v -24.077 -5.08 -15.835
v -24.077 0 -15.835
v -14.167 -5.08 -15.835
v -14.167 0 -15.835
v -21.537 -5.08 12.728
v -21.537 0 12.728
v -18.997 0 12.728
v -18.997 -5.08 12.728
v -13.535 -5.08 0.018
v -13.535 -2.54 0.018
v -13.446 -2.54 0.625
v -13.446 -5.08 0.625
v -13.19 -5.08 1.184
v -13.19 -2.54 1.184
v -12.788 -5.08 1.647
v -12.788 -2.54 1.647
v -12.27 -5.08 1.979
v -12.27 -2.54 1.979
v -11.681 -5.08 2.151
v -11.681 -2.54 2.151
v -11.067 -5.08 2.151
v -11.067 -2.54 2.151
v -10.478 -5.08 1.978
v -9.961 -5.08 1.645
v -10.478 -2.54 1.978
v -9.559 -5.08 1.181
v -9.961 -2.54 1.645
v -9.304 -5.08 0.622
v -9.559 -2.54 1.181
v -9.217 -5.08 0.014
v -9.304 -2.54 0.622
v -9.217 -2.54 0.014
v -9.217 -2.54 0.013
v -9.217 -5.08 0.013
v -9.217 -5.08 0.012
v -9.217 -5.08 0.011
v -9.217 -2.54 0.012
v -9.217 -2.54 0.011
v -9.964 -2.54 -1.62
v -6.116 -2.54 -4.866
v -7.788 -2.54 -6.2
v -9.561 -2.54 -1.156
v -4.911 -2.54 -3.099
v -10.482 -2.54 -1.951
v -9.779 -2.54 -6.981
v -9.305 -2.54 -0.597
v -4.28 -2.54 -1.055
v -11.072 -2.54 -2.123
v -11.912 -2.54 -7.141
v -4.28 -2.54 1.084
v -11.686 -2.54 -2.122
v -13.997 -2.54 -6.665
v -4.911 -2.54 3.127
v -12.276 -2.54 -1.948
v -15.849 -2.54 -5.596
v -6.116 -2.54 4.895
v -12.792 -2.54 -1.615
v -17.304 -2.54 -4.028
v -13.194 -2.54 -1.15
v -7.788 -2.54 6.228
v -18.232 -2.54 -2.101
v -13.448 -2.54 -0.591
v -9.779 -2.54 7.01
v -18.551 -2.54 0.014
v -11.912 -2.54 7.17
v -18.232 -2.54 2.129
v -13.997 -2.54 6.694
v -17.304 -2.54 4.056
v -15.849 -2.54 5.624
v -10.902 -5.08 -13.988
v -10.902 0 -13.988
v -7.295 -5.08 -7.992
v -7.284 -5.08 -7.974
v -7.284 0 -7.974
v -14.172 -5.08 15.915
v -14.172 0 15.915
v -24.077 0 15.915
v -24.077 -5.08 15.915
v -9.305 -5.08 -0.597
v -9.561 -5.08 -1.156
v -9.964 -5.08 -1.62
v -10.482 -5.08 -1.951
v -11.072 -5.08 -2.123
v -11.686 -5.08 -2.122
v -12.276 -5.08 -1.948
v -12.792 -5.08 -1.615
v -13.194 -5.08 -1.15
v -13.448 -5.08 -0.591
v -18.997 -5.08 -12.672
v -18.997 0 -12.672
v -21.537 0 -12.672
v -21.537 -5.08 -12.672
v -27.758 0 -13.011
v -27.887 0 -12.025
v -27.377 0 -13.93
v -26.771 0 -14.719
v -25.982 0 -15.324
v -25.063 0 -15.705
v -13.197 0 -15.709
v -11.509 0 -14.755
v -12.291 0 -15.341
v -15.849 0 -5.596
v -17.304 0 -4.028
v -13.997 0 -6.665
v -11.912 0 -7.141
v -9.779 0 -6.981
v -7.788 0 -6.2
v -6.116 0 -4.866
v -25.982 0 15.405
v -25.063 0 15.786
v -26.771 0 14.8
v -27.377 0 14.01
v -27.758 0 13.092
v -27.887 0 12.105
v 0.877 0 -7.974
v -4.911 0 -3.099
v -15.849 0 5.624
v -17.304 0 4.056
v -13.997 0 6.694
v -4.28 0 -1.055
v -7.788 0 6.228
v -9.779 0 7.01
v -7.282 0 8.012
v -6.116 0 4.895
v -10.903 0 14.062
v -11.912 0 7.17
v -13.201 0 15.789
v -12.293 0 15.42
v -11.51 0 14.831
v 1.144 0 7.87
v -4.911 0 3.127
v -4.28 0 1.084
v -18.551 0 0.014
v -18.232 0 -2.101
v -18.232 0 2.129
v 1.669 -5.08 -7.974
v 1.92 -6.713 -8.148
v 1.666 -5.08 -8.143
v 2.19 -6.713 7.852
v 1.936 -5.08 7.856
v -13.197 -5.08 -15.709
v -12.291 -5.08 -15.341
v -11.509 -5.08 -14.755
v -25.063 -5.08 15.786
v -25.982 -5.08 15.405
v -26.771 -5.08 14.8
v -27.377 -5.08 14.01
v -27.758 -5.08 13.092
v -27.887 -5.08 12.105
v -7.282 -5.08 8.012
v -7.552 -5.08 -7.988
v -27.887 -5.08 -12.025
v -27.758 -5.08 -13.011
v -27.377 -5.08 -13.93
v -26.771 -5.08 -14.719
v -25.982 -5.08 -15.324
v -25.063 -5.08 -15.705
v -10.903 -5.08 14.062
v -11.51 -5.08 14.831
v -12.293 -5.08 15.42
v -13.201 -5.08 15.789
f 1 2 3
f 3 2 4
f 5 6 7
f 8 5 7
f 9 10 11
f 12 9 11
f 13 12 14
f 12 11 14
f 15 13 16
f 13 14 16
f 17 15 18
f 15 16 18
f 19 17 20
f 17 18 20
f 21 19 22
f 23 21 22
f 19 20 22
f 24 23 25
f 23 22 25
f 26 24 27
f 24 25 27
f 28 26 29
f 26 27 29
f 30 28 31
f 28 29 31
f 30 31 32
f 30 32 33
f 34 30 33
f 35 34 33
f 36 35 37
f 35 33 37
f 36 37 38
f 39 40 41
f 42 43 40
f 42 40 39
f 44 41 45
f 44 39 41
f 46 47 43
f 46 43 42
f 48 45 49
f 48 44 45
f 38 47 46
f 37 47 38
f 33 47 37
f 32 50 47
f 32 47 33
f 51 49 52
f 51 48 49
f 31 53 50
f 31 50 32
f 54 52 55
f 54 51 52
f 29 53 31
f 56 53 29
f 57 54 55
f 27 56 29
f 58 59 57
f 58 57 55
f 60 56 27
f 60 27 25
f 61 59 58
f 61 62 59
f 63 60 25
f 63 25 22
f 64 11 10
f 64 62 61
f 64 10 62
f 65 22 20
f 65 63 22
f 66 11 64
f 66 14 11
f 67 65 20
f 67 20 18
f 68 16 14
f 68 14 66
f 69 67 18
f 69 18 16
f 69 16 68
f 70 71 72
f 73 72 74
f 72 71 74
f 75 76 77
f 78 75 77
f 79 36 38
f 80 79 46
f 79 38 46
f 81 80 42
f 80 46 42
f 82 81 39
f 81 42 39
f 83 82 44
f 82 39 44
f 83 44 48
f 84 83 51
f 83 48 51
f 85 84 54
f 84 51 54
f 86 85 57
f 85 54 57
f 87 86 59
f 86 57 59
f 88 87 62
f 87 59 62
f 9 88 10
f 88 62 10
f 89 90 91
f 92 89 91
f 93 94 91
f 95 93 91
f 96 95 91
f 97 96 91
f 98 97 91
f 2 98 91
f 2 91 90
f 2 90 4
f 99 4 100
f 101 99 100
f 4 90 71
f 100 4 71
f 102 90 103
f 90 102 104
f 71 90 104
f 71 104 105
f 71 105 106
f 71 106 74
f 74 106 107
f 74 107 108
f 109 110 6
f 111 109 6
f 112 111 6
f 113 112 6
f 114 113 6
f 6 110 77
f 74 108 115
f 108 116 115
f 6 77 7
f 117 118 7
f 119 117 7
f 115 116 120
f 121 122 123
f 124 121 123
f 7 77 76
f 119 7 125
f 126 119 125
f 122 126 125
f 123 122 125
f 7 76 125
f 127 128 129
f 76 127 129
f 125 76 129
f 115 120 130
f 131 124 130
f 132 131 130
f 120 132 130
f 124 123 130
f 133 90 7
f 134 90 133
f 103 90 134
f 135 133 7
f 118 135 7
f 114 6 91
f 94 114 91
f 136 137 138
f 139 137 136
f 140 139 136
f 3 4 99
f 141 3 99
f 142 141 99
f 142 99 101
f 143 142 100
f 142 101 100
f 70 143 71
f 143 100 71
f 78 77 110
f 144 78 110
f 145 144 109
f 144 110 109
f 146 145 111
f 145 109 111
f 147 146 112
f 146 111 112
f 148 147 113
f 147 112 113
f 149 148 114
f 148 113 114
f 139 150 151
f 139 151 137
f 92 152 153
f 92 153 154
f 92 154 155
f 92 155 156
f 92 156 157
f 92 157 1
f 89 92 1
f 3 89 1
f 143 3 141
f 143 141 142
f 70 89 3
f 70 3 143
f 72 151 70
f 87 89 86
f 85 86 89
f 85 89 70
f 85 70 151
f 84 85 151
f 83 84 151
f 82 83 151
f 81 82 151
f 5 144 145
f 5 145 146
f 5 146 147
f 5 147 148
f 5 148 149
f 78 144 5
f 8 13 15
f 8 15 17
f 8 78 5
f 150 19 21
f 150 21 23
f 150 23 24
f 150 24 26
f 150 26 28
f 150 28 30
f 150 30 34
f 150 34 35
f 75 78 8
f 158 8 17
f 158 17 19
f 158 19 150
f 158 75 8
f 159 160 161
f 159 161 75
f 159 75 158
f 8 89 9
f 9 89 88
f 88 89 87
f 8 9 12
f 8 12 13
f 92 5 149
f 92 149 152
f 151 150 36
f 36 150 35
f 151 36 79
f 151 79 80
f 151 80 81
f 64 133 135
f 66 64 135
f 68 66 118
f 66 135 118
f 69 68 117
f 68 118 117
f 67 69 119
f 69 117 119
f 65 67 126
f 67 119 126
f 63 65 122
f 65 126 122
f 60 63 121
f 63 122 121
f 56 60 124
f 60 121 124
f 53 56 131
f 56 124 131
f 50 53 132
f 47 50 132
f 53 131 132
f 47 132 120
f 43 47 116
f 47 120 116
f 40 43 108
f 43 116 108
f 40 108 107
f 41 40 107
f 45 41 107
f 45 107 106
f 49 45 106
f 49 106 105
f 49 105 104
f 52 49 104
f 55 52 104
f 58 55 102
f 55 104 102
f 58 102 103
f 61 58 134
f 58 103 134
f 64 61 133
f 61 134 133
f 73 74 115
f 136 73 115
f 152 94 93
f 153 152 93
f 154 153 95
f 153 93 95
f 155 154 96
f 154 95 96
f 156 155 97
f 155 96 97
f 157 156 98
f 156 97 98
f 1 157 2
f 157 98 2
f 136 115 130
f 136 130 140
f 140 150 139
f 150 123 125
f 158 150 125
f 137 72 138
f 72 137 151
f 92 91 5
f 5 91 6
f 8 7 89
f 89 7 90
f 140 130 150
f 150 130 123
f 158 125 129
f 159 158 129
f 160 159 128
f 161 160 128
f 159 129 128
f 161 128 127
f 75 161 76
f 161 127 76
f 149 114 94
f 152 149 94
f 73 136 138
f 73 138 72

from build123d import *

# Parameters (mm, degrees)
F1_DEPTH = 5.08
F2_R     = 7.1755
F2_R_2   = 2.1589999972
F3_DEPTH = 2.54
F5_DEPTH = 16.002
F6_DEPTH = 25.4


with BuildPart() as f1:
    # F0 (on Front) → F1 (new body)
    with BuildSketch(Plane.XZ):
        with BuildLine():
            ThreePointArc((-24.0773800019, 15.9154809675), (-26.7714568383, 14.7995578038), (-27.8873800019, 12.1054809675))
            Line((-27.8873800019, 12.1054809675), (-27.8873800019, 0.0404809675))
            Line((-27.8873800019, 0.0404809675), (-21.5373800019, 0.0303607256))
            Line((-21.5373800019, 0.0303607256), (-21.5373800019, 12.7283366773))
            Line((-21.5373800019, 12.7283366773), (-18.9973800019, 12.7283366773))
            Line((-18.9973800019, 12.7283366773), (-18.9973800019, 0.0263126289))
            Line((-18.9973800019, 0.0263126289), (-13.5345559632, 0.0176063138))
            ThreePointArc((-13.5345559632, 0.0176063138), (-11.3738382656, 2.1731647505), (-9.2165587051, 0.014165436))
            ThreePointArc((-9.2165587051, 0.014165436), (-9.2165593906, 0.0124449965), (-9.216561447, 0.0107245581))
            Line((-9.216561447, 0.0107245581), (-3.1205702461, 0.0010091399))
            ThreePointArc((-3.1205702461, 0.0010091399), (-3.2577129888, 1.0180311008), (-3.6613210566, 1.9615576391))
            Line((-3.6613210566, 1.9615576391), (-7.2822325162, 8.0117988382))
            Line((-7.2822325162, 8.0117988382), (-10.9031439759, 14.0620400372))
            ThreePointArc((-10.9031439759, 14.0620400372), (-12.2933474445, 15.4198881585), (-14.1723910768, 15.9154809675))
            Line((-14.1723910768, 15.9154809675), (-24.0773800019, 15.9154809675))
        make_face()
        with BuildLine():
            Line((-21.5373800019, 0.0303607256), (-27.8873800019, 0.0404809675))
            Line((-27.8873800019, 0.0404809675), (-27.8873800019, -12.0245190325))
            ThreePointArc((-27.8873800019, -12.0245190325), (-26.7714568383, -14.7185958688), (-24.0773800019, -15.8345190325))
            Line((-24.0773800019, -15.8345190325), (-14.1667308046, -15.8345190325))
            ThreePointArc((-14.1667308046, -15.8345190325), (-12.2914170541, -15.3410380415), (-10.901894216, -13.9884289209))
            Line((-10.901894216, -13.9884289209), (-7.2838128924, -7.97367012))
            Line((-7.2838128924, -7.97367012), (-3.6657315689, -1.9589113191))
            ThreePointArc((-3.6657315689, -1.9589113191), (-3.2599220493, -1.0160093387), (-3.1205702461, 0.0010091399))
            Line((-3.1205702461, 0.0010091399), (-9.216561447, 0.0107245581))
            ThreePointArc((-9.216561447, 0.0107245581), (-11.378999583, -2.1448318221), (-13.5345559632, 0.0176063138))
            Line((-13.5345559632, 0.0176063138), (-18.9973800019, 0.0263126289))
            Line((-18.9973800019, 0.0263126289), (-18.9973800019, -12.6716633227))
            Line((-18.9973800019, -12.6716633227), (-21.5373800019, -12.6716633227))
            Line((-21.5373800019, -12.6716633227), (-21.5373800019, 0.0303607256))
        make_face()
        with BuildLine():
            Line((2.1900159532, 7.8521110746), (-7.2822325162, 8.0117988382))
            Line((-7.2822325162, 8.0117988382), (-3.6613210566, 1.9615576391))
            ThreePointArc((-3.6613210566, 1.9615576391), (-3.2577129888, 1.0180311008), (-3.1205702461, 0.0010091399))
            ThreePointArc((-3.1205702461, 0.0010091399), (-3.2599220493, -1.0160093387), (-3.6657315689, -1.9589113191))
            Line((-3.6657315689, -1.9589113191), (-7.2838128924, -7.97367012))
            Line((-7.2838128924, -7.97367012), (1.9232172503, -7.97367012))
            Line((1.9232172503, -7.97367012), (2.1900159532, 7.8521110746))
        make_face()
    extrude(amount=F1_DEPTH)

    # F2 (on face) → F3 (cut)
    with BuildSketch(Plane(origin=(0, 0, 0), x_dir=(-1, 0, 0), z_dir=(0, 1, 0))):
        with Locations((11.3755587051, 0.014165436)):
            Circle(F2_R)
        with Locations((11.3755587023, 0.014165436)):
            Circle(F2_R_2, mode=Mode.SUBTRACT)
    extrude(amount=-F3_DEPTH, mode=Mode.SUBTRACT)

    # F4 (on face) → F5 (join)
    with BuildSketch(Plane(origin=(0.1329593338, 0, 7.8867899338), x_dir=(0.999857926, 0, -0.0168560904), z_dir=(0.0168560904, 0, 0.999857926))):
        Polygon((1.8028132562, -5.08), (-7.4162455056, -5.08), (2.0573489152, -6.7131863907), align=None)
    extrude(amount=-F5_DEPTH)

    # F4 (on face) → F6 (cut)
    with BuildSketch(Plane(origin=(0.1329593338, 0, 7.8867899338), x_dir=(0.999857926, 0, -0.0168560904), z_dir=(0.0168560904, 0, 0.999857926))):
        Polygon((1.0110841831, 0), (1.8028132562, -5.08), (2.0573489152, -5.08), (2.0573489152, 0), align=None)
    extrude(amount=-F6_DEPTH, mode=Mode.SUBTRACT)


solid = f1.part
